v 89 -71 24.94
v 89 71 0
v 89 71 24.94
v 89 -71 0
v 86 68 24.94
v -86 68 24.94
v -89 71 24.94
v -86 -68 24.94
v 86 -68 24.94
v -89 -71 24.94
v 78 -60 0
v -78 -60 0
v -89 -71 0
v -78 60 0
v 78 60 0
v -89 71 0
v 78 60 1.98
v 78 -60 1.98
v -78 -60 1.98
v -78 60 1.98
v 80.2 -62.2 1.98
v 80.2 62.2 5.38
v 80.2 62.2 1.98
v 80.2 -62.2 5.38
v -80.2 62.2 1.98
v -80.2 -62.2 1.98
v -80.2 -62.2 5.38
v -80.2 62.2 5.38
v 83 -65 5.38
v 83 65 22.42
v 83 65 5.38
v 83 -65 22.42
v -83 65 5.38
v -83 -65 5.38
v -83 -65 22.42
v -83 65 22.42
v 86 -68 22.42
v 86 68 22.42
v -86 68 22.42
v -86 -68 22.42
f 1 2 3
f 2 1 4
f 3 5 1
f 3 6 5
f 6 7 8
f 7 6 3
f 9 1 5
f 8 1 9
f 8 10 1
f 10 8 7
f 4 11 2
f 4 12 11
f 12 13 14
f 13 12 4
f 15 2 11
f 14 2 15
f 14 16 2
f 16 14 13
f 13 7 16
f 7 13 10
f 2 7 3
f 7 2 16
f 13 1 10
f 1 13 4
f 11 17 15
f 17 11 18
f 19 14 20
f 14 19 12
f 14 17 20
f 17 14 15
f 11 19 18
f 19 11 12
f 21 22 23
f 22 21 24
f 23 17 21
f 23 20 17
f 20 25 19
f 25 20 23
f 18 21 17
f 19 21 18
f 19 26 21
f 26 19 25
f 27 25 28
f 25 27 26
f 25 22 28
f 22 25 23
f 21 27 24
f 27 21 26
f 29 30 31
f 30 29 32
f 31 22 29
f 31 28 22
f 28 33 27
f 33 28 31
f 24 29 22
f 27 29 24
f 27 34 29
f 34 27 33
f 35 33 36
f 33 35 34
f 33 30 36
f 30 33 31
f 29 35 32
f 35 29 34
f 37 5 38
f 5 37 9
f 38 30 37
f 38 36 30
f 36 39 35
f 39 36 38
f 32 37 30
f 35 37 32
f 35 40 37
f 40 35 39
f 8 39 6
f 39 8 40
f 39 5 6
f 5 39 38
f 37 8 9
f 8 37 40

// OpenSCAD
// Caixa paramétrica para litofania 160 x 124 x 3 mm.
// Conceito V5 aprovado; espessura LED e tomada USB medidas pelo utilizador.
// USB-C perpendicular a placa: a janela fica apenas na tampa opaca.
// Imprimir body com a frente em Z=0, lid com a face plana em Z=0.

part = "body"; // body, lid, assembly
$fn = 48;

// Elementos medidos e dimensões propostas (mm)
litho_w = 160;
litho_h = 124;
litho_t = 3;
outer_w = 178;
outer_h = 142;
front_window_w = 156;
front_window_h = 120;
front_lip_t = 2;
litho_xy_clearance = 0.2; // por lado
litho_z_clearance = 0.4;
inner_w = 166;
inner_h = 130;
rear_seat_w = 172;
rear_seat_h = 136;
rear_seat_depth = 2.5;
rear_lid_xy_clearance = 0.2; // por lado
rear_lid_t = 2.4;
light_gap = 15; // verso da litofania ate face emissora do LED
led_total_thickness = 2.04; // espessura total: face superior luminosa ate base traseira

// Porta USB-C aponta para TRAS da placa, junto da extremidade direita.
usb_port_w = 8.88; // largura exterior da tomada medida
usb_port_h = 3.04; // altura exterior da tomada medida
usb_center_x = 76; // ajustar com a placa real se necessario
usb_center_y = 0;
usb_window_x = 12; // folga para inserir a ficha pela traseira
usb_window_y = 18;

litho_pocket_w = litho_w + 2*litho_xy_clearance;
litho_pocket_h = litho_h + 2*litho_xy_clearance;
litho_pocket_d = litho_t + litho_z_clearance;
panel_back_z = front_lip_t + litho_pocket_d;
body_depth = panel_back_z + light_gap + led_total_thickness + rear_seat_depth;
seat_start_z = body_depth - rear_seat_depth;
rear_lid_w = rear_seat_w - 2*rear_lid_xy_clearance;
rear_lid_h = rear_seat_h - 2*rear_lid_xy_clearance;
eps = 0.02;

module body() {
    difference() {
        translate([-outer_w/2, -outer_h/2, 0])
            cube([outer_w, outer_h, body_depth]);
        // Janela frontal: frente impressa sobre o prato.
        translate([-front_window_w/2, -front_window_h/2, -eps])
            cube([front_window_w, front_window_h, front_lip_t+2*eps]);
        // Assento da litofania, inserida pelas costas.
        translate([-litho_pocket_w/2, -litho_pocket_h/2, front_lip_t-eps])
            cube([litho_pocket_w, litho_pocket_h, litho_pocket_d+2*eps]);
        // Camara luminosa. A litofania e colada na margem escondida.
        translate([-inner_w/2, -inner_h/2, panel_back_z-eps])
            cube([inner_w, inner_h, seat_start_z-panel_back_z+2*eps]);
        // Rebaixo posterior: deixa uma aba de apoio de 3 mm.
        translate([-rear_seat_w/2, -rear_seat_h/2, seat_start_z-eps])
            cube([rear_seat_w, rear_seat_h, rear_seat_depth+2*eps]);
        // Laterais do corpo inteiras, sem abertura para USB.
    }
}

module lid() {
    difference() {
        translate([-rear_lid_w/2, -rear_lid_h/2, 0])
            cube([rear_lid_w, rear_lid_h, rear_lid_t]);
        // Janela FECHADA no plano da tampa, para a porta voltada para tras.
        translate([usb_center_x-usb_window_x/2,
                   usb_center_y-usb_window_y/2, -eps])
            cube([usb_window_x, usb_window_y, rear_lid_t+2*eps]);
    }
}

if (part == "body") body();
else if (part == "lid") lid();
else if (part == "assembly") {
    color("#303d49") body();
    color("#e4d9ba") translate([0,0,front_lip_t+litho_t/2])
        cube([litho_w, litho_h, litho_t], center=true);
    color("#dbe4e9") translate([0,0,seat_start_z]) lid();
}
